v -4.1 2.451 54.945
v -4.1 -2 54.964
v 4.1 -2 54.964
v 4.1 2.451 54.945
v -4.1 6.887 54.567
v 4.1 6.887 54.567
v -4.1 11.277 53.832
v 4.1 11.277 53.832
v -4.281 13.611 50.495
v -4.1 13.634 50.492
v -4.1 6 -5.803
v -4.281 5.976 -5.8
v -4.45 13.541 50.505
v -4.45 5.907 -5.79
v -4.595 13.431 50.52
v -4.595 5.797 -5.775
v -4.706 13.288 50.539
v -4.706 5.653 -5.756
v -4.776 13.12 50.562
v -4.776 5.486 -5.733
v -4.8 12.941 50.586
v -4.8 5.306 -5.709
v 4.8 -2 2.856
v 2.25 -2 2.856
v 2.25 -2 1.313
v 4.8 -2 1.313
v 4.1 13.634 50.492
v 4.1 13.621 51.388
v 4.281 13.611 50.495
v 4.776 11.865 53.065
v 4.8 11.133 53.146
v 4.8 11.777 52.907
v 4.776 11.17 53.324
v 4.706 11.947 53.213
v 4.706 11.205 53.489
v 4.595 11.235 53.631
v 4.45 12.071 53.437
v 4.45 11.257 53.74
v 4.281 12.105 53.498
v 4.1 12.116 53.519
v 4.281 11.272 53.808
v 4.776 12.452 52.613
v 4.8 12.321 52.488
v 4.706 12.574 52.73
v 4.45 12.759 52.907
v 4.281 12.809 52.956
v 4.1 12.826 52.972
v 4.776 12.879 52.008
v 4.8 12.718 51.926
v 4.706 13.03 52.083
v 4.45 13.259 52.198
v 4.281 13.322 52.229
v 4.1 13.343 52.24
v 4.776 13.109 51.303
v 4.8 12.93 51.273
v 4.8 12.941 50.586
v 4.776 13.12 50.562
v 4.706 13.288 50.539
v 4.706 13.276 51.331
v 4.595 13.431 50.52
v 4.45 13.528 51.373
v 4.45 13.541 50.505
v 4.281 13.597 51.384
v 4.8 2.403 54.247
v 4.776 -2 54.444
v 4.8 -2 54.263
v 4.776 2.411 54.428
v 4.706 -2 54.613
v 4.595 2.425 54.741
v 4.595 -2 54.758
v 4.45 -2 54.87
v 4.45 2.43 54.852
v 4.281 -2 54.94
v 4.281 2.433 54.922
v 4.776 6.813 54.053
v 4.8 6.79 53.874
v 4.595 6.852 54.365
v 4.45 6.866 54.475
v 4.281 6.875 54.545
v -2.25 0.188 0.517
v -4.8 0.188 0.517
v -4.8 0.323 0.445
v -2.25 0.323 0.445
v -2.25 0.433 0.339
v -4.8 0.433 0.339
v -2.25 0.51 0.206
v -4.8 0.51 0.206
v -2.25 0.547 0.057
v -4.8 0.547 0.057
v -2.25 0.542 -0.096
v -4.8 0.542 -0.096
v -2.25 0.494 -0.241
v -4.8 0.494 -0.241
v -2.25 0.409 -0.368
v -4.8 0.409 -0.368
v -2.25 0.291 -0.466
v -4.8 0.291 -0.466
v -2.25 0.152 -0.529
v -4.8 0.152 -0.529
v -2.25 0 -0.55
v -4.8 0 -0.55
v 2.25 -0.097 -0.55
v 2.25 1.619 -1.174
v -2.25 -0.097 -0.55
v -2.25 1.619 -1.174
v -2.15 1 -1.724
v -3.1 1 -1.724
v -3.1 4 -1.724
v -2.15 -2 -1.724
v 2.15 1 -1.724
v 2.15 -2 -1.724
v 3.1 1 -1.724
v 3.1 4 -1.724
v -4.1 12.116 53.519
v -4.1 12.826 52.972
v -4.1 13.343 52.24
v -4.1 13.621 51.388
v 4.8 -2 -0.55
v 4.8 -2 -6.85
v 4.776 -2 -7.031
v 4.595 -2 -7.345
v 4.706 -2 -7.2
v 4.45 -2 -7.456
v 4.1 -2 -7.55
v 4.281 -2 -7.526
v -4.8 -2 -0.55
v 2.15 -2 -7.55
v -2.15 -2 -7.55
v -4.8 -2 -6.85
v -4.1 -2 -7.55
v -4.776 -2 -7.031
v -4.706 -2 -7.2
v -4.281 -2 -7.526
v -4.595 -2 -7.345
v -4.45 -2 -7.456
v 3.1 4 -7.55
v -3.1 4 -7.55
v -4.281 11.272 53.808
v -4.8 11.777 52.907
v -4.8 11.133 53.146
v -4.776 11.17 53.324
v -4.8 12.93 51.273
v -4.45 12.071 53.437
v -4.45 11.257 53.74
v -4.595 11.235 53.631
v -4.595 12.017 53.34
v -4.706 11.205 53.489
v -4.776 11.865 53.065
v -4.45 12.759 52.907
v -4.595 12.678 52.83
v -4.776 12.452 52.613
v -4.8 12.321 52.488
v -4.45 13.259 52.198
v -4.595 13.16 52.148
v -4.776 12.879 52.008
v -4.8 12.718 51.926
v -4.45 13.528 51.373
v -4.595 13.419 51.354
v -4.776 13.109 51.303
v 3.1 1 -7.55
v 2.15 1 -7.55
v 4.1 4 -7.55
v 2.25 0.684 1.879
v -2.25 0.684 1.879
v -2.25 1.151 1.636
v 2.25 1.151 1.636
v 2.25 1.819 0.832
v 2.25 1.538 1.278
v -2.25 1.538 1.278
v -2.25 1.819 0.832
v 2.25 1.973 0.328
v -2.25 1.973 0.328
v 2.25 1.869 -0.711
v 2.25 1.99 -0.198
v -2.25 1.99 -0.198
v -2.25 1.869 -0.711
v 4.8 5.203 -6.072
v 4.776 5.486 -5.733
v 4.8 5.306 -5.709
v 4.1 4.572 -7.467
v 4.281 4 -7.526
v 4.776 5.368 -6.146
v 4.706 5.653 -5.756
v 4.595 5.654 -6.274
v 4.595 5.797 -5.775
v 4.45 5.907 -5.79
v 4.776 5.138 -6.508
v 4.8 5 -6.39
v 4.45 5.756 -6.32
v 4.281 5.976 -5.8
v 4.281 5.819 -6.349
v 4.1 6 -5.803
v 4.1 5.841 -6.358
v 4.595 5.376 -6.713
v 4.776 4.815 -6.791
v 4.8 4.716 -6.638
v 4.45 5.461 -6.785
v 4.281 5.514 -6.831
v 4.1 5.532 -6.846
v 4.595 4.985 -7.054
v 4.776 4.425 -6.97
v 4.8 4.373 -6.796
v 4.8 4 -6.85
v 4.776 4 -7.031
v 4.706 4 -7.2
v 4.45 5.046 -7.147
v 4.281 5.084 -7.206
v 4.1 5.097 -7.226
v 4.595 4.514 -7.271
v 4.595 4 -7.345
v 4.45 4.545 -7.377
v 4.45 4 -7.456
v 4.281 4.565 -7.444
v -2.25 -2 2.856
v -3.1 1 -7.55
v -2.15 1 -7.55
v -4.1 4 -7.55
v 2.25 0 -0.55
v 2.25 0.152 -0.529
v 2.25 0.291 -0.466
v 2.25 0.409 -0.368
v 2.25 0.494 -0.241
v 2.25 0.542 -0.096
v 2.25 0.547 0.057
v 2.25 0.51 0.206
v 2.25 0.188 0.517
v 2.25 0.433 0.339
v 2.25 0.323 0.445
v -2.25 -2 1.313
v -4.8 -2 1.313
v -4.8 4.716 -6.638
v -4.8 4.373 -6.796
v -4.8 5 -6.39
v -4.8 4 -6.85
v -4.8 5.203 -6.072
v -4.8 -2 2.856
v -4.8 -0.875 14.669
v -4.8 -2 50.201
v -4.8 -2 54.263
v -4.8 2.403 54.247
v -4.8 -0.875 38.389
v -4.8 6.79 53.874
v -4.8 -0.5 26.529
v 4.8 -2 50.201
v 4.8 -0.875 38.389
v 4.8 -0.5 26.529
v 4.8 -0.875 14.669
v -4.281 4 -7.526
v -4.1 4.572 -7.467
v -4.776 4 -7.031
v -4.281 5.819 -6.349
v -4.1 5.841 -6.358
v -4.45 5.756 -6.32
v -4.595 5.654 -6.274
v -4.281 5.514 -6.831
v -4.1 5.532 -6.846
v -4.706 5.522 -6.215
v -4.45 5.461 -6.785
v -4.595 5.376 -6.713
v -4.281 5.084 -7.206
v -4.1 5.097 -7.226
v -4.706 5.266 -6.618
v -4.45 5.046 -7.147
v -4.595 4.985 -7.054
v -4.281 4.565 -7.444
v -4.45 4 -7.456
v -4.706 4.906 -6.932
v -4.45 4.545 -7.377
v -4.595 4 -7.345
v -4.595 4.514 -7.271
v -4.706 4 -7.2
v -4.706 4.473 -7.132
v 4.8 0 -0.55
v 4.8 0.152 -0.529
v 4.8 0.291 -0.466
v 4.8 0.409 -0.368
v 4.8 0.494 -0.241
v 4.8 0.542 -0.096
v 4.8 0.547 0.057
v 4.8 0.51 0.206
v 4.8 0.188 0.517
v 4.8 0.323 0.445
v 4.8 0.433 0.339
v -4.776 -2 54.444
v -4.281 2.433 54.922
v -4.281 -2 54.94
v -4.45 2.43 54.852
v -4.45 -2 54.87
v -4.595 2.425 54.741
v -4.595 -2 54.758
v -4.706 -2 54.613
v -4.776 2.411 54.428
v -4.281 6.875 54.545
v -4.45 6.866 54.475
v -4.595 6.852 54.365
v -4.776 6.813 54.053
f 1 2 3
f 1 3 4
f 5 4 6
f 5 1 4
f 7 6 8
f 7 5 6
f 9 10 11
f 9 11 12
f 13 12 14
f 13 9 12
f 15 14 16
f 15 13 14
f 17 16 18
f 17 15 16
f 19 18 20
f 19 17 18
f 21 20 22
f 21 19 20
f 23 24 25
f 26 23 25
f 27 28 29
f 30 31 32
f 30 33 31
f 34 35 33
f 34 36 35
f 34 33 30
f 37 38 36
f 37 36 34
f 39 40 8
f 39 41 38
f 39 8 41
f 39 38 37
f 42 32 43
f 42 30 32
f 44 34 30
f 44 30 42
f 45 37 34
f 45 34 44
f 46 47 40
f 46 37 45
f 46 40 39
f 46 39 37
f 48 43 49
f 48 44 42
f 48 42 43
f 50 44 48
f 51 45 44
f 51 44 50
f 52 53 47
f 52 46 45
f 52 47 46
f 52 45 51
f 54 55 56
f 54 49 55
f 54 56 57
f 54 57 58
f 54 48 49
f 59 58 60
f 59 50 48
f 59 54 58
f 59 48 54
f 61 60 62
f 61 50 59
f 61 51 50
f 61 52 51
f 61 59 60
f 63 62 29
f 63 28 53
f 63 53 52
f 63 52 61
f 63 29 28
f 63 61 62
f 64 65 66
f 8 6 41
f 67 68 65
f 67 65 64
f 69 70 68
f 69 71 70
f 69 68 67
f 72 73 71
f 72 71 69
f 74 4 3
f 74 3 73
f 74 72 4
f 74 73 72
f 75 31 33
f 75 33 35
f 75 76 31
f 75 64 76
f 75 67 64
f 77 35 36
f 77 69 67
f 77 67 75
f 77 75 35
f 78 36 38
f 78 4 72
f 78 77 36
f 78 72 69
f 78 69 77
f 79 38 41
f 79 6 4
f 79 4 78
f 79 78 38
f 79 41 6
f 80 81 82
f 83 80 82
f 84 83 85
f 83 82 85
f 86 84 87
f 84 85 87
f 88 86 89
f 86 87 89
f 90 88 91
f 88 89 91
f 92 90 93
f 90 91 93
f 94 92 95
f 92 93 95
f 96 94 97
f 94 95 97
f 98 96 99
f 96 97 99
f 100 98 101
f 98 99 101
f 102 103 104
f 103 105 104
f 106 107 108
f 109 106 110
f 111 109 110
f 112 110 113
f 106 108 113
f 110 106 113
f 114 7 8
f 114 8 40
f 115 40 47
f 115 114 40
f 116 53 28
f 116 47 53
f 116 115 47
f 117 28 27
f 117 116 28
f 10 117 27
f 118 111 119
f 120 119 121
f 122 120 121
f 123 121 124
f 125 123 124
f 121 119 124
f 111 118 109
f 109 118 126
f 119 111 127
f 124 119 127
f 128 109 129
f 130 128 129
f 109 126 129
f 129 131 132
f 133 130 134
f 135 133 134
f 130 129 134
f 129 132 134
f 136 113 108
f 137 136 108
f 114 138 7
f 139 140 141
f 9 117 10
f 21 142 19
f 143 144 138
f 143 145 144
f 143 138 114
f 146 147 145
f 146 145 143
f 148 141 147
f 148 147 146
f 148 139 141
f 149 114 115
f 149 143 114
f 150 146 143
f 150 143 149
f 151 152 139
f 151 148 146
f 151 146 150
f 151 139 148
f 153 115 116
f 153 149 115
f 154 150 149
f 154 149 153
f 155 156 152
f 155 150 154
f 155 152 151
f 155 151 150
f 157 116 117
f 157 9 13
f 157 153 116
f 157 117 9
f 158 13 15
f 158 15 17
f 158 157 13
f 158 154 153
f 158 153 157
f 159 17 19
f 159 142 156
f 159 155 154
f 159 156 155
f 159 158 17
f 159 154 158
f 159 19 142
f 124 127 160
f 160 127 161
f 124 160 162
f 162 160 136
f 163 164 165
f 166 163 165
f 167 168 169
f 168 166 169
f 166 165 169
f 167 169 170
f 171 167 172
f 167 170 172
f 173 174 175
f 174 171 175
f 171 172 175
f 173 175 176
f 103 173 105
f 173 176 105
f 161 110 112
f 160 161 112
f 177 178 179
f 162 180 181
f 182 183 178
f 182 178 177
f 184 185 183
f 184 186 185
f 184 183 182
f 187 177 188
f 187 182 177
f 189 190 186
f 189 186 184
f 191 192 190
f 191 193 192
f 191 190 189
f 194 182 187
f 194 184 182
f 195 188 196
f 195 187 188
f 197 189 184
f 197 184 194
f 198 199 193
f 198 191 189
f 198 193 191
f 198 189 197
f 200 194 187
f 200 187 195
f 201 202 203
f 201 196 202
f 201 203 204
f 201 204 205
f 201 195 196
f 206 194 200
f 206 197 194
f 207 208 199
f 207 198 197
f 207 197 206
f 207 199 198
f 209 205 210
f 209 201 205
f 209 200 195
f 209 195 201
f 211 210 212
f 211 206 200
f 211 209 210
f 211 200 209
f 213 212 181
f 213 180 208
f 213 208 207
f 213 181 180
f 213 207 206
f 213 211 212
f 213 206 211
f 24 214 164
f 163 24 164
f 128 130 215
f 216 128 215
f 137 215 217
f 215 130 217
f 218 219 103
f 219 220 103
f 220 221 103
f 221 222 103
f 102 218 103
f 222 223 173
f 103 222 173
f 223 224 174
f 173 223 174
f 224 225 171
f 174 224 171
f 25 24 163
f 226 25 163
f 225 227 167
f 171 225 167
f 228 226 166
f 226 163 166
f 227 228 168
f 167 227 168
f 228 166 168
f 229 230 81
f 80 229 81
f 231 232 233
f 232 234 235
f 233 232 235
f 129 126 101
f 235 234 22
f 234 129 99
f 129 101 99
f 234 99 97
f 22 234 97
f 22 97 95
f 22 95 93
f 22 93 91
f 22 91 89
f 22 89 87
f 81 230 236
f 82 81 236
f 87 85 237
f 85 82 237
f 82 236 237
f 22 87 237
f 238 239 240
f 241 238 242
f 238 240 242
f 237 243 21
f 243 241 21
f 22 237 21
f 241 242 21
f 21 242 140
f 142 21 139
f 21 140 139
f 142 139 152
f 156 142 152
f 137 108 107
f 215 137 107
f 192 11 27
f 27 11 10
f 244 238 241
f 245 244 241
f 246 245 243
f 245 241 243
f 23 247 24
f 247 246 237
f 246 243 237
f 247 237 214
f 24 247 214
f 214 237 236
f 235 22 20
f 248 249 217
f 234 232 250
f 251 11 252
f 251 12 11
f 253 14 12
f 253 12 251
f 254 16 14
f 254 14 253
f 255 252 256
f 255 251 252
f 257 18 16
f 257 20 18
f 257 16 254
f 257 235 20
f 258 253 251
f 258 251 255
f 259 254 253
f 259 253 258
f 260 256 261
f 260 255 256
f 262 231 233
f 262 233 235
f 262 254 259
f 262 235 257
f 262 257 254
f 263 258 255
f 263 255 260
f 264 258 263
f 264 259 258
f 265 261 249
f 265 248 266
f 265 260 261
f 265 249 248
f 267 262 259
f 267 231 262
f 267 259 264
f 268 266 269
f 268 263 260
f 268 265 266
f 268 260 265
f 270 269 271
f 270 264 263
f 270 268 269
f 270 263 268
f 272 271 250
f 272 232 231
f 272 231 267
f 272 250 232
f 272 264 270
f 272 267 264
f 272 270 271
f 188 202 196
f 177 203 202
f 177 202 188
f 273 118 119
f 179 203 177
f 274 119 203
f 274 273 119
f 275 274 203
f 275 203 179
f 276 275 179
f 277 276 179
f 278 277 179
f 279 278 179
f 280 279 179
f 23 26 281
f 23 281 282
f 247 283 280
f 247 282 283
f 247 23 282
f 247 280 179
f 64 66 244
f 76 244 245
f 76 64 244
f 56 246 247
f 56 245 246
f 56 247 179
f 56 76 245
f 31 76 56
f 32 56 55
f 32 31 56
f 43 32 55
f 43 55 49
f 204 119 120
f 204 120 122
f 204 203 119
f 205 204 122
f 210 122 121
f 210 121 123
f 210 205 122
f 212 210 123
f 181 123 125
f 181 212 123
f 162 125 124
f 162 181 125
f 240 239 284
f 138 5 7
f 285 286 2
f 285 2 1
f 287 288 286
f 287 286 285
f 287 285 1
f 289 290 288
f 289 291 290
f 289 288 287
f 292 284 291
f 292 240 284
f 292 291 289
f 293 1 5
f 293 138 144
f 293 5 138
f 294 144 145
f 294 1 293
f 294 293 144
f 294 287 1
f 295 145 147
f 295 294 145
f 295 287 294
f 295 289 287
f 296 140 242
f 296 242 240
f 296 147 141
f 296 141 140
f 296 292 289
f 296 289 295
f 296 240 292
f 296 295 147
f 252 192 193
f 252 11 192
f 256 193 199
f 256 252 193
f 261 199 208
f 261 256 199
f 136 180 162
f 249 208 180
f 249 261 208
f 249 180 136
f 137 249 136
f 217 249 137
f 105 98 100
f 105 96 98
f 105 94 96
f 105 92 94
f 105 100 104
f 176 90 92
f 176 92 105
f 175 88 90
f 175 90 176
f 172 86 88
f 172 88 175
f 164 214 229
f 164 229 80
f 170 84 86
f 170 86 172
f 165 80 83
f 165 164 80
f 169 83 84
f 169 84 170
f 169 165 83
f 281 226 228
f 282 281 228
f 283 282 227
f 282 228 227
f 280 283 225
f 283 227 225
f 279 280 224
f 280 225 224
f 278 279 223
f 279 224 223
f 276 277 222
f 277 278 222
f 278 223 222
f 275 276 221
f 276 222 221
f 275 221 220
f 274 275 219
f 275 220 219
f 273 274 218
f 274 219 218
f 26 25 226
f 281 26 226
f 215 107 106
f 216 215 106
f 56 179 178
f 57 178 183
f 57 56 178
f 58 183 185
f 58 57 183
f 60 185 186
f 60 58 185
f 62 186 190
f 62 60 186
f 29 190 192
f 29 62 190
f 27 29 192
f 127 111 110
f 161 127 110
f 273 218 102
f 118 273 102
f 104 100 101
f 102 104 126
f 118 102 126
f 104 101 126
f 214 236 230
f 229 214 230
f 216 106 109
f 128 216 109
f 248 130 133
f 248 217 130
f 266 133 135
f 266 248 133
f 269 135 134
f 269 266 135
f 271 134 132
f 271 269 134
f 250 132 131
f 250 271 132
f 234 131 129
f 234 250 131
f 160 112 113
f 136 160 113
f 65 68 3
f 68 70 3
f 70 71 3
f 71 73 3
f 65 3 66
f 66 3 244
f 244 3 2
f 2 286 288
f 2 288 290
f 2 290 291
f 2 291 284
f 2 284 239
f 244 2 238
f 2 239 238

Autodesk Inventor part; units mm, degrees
ref_plane "YZ Plane" through (0, 0, 0) normal (1, 0, 0) x (0, 1, 0)
ref_plane "XZ Plane" through (0, 0, 0) normal (0, 1, 0) x (-1, 0, 0)
ref_plane "Slot Start Plane" through (0, 0, -1.7245) normal (0, 0, 1) x (1, 0, 0)
sketch "Key Profile" plane through (0, 0, 0) normal (1, 0, 0) x (0, 1, 0)
  line L0 (-2, 2.8563) -> (0.684, 1.8794)
  arc A0 (1.6188, -1.1745) -> (0.684, 1.8794) centre (0, 0) ccw
  line L1 (-2, 1.3132) -> (0.1881, 0.5168)
  arc A1 (0, -0.55) -> (0.1881, 0.5168) centre (0, 0) ccw
  line L2 (-2, 2.8563) -> (-2, -0.55)
  line L3 (0, 0) -> (-2, 0) construction
  line L4 (0, -0.55) -> (-2, -0.55)
  line L5 (1.6188, -1.1745) -> (-0.097, -0.55)
  line L6 (6, -5.8029) -> (14, 53.1883)
  line L7 (-2, 54.9636) -> (-2, 2.8563)
  arc A2 (14, 53.1883) -> (-2, 54.9636) centre (0, 0) ccw
  line L8 (-2, -0.55) -> (-2, -7.55)
  arc A3 (4, -7.55) -> (6, -5.8029) centre (4, -5.5317) ccw
  line L9 (-2, -7.55) -> (4, -7.55)
  arc A4 (-2, 2.8563) -> (-2, 50.2011) centre (-188.0444, 26.5287) ccw
  point P0 (-0.5, 26.5287)
  dimension "hingeCutRad" = 0.55
  dimension "hingeDepth" = 2
  dimension "d10" = 2
  dimension "keyLength" = 55
  dimension "blackKeyExtraHeight" = 8
  dimension "keyHeight" = 8
  dimension "d107" = 20
  dimension "d122" = 4
  dimension "slotOffset" = 1.1745
  dimension "backWidth" = 7
  dimension "d129" = 4.7625
  dimension "d130" = 1.5
extrude "Key" add sketch "Key Profile" along normal mid plane 9.6 contours A4 L7 A2 L6 A3 L9 L8 L4 L5 A0 L0 | L0 A0 L5 L4 A1 L1 L2
extrude "Protrusion Cutout" cut sketch "Key Profile" along normal mid plane 4.5 contours L0 A0 L5 L4 A1 L1 L2
fillet "Front Fillet" radius 3 1 edges at (0, 14, 53.1883)
sketch "Slot Sketch" plane through (0, 0, -1.7245) normal (0, 0, 1) x (1, 0, 0)
  line L0 (2.15, -2) -> (2.15, 1)
  line L1 (3.1, 4) -> (-3.1, 4)
  line L2 (-2.15, 1) -> (-2.15, -2)
  line L3 (-2.15, -2) -> (2.15, -2)
  line L4 (0, -2) -> (0, 4) construction
  line L5 (-3.1, 4) -> (-3.1, 1)
  line L6 (-3.1, 1) -> (-2.15, 1)
  line L7 (2.15, 1) -> (3.1, 1)
  line L8 (3.1, 1) -> (3.1, 4)
  point P0 (0, 0)
  dimension "d109" = 2
  dimension "slotHeadOffset" = 1
  dimension "slotHeadHeight" = 3
  dimension "slotHeadWidth" = 6.2
  dimension "neckSlotWidth" = 4.3
extrude "Slot" cut sketch "Slot Sketch" against normal through all
fillet "Edge Softening" radius 0.7 10 edges at (4.8, 13.1123, 52.6256) (4.8, 4.6727, 54.8011) (4.8, 5.3278, -7.0517) (4.8, 1, -7.55) (4.8, 9.8172, 22.3446) (-4.8, 5.3278, -7.0517) (-4.8, 1, -7.55) (-4.8, 13.1123, 52.6256) (-4.8, 4.6727, 54.8011) (-4.8, 9.8172, 22.3446)
equation "\"headHeight\" = 3"
equation "\"headOffset\" = 1"
equation "\"keySpacing\" = 0.5"
equation "\"hingeRadTol\" = 0.05"
equation "\"hingeRegRadTol\" = 0.5"
equation "\"hingeRegWidthTol\" = 0.5"
properties part number "BlackKey0" material "PLA Plastic (Black)"
